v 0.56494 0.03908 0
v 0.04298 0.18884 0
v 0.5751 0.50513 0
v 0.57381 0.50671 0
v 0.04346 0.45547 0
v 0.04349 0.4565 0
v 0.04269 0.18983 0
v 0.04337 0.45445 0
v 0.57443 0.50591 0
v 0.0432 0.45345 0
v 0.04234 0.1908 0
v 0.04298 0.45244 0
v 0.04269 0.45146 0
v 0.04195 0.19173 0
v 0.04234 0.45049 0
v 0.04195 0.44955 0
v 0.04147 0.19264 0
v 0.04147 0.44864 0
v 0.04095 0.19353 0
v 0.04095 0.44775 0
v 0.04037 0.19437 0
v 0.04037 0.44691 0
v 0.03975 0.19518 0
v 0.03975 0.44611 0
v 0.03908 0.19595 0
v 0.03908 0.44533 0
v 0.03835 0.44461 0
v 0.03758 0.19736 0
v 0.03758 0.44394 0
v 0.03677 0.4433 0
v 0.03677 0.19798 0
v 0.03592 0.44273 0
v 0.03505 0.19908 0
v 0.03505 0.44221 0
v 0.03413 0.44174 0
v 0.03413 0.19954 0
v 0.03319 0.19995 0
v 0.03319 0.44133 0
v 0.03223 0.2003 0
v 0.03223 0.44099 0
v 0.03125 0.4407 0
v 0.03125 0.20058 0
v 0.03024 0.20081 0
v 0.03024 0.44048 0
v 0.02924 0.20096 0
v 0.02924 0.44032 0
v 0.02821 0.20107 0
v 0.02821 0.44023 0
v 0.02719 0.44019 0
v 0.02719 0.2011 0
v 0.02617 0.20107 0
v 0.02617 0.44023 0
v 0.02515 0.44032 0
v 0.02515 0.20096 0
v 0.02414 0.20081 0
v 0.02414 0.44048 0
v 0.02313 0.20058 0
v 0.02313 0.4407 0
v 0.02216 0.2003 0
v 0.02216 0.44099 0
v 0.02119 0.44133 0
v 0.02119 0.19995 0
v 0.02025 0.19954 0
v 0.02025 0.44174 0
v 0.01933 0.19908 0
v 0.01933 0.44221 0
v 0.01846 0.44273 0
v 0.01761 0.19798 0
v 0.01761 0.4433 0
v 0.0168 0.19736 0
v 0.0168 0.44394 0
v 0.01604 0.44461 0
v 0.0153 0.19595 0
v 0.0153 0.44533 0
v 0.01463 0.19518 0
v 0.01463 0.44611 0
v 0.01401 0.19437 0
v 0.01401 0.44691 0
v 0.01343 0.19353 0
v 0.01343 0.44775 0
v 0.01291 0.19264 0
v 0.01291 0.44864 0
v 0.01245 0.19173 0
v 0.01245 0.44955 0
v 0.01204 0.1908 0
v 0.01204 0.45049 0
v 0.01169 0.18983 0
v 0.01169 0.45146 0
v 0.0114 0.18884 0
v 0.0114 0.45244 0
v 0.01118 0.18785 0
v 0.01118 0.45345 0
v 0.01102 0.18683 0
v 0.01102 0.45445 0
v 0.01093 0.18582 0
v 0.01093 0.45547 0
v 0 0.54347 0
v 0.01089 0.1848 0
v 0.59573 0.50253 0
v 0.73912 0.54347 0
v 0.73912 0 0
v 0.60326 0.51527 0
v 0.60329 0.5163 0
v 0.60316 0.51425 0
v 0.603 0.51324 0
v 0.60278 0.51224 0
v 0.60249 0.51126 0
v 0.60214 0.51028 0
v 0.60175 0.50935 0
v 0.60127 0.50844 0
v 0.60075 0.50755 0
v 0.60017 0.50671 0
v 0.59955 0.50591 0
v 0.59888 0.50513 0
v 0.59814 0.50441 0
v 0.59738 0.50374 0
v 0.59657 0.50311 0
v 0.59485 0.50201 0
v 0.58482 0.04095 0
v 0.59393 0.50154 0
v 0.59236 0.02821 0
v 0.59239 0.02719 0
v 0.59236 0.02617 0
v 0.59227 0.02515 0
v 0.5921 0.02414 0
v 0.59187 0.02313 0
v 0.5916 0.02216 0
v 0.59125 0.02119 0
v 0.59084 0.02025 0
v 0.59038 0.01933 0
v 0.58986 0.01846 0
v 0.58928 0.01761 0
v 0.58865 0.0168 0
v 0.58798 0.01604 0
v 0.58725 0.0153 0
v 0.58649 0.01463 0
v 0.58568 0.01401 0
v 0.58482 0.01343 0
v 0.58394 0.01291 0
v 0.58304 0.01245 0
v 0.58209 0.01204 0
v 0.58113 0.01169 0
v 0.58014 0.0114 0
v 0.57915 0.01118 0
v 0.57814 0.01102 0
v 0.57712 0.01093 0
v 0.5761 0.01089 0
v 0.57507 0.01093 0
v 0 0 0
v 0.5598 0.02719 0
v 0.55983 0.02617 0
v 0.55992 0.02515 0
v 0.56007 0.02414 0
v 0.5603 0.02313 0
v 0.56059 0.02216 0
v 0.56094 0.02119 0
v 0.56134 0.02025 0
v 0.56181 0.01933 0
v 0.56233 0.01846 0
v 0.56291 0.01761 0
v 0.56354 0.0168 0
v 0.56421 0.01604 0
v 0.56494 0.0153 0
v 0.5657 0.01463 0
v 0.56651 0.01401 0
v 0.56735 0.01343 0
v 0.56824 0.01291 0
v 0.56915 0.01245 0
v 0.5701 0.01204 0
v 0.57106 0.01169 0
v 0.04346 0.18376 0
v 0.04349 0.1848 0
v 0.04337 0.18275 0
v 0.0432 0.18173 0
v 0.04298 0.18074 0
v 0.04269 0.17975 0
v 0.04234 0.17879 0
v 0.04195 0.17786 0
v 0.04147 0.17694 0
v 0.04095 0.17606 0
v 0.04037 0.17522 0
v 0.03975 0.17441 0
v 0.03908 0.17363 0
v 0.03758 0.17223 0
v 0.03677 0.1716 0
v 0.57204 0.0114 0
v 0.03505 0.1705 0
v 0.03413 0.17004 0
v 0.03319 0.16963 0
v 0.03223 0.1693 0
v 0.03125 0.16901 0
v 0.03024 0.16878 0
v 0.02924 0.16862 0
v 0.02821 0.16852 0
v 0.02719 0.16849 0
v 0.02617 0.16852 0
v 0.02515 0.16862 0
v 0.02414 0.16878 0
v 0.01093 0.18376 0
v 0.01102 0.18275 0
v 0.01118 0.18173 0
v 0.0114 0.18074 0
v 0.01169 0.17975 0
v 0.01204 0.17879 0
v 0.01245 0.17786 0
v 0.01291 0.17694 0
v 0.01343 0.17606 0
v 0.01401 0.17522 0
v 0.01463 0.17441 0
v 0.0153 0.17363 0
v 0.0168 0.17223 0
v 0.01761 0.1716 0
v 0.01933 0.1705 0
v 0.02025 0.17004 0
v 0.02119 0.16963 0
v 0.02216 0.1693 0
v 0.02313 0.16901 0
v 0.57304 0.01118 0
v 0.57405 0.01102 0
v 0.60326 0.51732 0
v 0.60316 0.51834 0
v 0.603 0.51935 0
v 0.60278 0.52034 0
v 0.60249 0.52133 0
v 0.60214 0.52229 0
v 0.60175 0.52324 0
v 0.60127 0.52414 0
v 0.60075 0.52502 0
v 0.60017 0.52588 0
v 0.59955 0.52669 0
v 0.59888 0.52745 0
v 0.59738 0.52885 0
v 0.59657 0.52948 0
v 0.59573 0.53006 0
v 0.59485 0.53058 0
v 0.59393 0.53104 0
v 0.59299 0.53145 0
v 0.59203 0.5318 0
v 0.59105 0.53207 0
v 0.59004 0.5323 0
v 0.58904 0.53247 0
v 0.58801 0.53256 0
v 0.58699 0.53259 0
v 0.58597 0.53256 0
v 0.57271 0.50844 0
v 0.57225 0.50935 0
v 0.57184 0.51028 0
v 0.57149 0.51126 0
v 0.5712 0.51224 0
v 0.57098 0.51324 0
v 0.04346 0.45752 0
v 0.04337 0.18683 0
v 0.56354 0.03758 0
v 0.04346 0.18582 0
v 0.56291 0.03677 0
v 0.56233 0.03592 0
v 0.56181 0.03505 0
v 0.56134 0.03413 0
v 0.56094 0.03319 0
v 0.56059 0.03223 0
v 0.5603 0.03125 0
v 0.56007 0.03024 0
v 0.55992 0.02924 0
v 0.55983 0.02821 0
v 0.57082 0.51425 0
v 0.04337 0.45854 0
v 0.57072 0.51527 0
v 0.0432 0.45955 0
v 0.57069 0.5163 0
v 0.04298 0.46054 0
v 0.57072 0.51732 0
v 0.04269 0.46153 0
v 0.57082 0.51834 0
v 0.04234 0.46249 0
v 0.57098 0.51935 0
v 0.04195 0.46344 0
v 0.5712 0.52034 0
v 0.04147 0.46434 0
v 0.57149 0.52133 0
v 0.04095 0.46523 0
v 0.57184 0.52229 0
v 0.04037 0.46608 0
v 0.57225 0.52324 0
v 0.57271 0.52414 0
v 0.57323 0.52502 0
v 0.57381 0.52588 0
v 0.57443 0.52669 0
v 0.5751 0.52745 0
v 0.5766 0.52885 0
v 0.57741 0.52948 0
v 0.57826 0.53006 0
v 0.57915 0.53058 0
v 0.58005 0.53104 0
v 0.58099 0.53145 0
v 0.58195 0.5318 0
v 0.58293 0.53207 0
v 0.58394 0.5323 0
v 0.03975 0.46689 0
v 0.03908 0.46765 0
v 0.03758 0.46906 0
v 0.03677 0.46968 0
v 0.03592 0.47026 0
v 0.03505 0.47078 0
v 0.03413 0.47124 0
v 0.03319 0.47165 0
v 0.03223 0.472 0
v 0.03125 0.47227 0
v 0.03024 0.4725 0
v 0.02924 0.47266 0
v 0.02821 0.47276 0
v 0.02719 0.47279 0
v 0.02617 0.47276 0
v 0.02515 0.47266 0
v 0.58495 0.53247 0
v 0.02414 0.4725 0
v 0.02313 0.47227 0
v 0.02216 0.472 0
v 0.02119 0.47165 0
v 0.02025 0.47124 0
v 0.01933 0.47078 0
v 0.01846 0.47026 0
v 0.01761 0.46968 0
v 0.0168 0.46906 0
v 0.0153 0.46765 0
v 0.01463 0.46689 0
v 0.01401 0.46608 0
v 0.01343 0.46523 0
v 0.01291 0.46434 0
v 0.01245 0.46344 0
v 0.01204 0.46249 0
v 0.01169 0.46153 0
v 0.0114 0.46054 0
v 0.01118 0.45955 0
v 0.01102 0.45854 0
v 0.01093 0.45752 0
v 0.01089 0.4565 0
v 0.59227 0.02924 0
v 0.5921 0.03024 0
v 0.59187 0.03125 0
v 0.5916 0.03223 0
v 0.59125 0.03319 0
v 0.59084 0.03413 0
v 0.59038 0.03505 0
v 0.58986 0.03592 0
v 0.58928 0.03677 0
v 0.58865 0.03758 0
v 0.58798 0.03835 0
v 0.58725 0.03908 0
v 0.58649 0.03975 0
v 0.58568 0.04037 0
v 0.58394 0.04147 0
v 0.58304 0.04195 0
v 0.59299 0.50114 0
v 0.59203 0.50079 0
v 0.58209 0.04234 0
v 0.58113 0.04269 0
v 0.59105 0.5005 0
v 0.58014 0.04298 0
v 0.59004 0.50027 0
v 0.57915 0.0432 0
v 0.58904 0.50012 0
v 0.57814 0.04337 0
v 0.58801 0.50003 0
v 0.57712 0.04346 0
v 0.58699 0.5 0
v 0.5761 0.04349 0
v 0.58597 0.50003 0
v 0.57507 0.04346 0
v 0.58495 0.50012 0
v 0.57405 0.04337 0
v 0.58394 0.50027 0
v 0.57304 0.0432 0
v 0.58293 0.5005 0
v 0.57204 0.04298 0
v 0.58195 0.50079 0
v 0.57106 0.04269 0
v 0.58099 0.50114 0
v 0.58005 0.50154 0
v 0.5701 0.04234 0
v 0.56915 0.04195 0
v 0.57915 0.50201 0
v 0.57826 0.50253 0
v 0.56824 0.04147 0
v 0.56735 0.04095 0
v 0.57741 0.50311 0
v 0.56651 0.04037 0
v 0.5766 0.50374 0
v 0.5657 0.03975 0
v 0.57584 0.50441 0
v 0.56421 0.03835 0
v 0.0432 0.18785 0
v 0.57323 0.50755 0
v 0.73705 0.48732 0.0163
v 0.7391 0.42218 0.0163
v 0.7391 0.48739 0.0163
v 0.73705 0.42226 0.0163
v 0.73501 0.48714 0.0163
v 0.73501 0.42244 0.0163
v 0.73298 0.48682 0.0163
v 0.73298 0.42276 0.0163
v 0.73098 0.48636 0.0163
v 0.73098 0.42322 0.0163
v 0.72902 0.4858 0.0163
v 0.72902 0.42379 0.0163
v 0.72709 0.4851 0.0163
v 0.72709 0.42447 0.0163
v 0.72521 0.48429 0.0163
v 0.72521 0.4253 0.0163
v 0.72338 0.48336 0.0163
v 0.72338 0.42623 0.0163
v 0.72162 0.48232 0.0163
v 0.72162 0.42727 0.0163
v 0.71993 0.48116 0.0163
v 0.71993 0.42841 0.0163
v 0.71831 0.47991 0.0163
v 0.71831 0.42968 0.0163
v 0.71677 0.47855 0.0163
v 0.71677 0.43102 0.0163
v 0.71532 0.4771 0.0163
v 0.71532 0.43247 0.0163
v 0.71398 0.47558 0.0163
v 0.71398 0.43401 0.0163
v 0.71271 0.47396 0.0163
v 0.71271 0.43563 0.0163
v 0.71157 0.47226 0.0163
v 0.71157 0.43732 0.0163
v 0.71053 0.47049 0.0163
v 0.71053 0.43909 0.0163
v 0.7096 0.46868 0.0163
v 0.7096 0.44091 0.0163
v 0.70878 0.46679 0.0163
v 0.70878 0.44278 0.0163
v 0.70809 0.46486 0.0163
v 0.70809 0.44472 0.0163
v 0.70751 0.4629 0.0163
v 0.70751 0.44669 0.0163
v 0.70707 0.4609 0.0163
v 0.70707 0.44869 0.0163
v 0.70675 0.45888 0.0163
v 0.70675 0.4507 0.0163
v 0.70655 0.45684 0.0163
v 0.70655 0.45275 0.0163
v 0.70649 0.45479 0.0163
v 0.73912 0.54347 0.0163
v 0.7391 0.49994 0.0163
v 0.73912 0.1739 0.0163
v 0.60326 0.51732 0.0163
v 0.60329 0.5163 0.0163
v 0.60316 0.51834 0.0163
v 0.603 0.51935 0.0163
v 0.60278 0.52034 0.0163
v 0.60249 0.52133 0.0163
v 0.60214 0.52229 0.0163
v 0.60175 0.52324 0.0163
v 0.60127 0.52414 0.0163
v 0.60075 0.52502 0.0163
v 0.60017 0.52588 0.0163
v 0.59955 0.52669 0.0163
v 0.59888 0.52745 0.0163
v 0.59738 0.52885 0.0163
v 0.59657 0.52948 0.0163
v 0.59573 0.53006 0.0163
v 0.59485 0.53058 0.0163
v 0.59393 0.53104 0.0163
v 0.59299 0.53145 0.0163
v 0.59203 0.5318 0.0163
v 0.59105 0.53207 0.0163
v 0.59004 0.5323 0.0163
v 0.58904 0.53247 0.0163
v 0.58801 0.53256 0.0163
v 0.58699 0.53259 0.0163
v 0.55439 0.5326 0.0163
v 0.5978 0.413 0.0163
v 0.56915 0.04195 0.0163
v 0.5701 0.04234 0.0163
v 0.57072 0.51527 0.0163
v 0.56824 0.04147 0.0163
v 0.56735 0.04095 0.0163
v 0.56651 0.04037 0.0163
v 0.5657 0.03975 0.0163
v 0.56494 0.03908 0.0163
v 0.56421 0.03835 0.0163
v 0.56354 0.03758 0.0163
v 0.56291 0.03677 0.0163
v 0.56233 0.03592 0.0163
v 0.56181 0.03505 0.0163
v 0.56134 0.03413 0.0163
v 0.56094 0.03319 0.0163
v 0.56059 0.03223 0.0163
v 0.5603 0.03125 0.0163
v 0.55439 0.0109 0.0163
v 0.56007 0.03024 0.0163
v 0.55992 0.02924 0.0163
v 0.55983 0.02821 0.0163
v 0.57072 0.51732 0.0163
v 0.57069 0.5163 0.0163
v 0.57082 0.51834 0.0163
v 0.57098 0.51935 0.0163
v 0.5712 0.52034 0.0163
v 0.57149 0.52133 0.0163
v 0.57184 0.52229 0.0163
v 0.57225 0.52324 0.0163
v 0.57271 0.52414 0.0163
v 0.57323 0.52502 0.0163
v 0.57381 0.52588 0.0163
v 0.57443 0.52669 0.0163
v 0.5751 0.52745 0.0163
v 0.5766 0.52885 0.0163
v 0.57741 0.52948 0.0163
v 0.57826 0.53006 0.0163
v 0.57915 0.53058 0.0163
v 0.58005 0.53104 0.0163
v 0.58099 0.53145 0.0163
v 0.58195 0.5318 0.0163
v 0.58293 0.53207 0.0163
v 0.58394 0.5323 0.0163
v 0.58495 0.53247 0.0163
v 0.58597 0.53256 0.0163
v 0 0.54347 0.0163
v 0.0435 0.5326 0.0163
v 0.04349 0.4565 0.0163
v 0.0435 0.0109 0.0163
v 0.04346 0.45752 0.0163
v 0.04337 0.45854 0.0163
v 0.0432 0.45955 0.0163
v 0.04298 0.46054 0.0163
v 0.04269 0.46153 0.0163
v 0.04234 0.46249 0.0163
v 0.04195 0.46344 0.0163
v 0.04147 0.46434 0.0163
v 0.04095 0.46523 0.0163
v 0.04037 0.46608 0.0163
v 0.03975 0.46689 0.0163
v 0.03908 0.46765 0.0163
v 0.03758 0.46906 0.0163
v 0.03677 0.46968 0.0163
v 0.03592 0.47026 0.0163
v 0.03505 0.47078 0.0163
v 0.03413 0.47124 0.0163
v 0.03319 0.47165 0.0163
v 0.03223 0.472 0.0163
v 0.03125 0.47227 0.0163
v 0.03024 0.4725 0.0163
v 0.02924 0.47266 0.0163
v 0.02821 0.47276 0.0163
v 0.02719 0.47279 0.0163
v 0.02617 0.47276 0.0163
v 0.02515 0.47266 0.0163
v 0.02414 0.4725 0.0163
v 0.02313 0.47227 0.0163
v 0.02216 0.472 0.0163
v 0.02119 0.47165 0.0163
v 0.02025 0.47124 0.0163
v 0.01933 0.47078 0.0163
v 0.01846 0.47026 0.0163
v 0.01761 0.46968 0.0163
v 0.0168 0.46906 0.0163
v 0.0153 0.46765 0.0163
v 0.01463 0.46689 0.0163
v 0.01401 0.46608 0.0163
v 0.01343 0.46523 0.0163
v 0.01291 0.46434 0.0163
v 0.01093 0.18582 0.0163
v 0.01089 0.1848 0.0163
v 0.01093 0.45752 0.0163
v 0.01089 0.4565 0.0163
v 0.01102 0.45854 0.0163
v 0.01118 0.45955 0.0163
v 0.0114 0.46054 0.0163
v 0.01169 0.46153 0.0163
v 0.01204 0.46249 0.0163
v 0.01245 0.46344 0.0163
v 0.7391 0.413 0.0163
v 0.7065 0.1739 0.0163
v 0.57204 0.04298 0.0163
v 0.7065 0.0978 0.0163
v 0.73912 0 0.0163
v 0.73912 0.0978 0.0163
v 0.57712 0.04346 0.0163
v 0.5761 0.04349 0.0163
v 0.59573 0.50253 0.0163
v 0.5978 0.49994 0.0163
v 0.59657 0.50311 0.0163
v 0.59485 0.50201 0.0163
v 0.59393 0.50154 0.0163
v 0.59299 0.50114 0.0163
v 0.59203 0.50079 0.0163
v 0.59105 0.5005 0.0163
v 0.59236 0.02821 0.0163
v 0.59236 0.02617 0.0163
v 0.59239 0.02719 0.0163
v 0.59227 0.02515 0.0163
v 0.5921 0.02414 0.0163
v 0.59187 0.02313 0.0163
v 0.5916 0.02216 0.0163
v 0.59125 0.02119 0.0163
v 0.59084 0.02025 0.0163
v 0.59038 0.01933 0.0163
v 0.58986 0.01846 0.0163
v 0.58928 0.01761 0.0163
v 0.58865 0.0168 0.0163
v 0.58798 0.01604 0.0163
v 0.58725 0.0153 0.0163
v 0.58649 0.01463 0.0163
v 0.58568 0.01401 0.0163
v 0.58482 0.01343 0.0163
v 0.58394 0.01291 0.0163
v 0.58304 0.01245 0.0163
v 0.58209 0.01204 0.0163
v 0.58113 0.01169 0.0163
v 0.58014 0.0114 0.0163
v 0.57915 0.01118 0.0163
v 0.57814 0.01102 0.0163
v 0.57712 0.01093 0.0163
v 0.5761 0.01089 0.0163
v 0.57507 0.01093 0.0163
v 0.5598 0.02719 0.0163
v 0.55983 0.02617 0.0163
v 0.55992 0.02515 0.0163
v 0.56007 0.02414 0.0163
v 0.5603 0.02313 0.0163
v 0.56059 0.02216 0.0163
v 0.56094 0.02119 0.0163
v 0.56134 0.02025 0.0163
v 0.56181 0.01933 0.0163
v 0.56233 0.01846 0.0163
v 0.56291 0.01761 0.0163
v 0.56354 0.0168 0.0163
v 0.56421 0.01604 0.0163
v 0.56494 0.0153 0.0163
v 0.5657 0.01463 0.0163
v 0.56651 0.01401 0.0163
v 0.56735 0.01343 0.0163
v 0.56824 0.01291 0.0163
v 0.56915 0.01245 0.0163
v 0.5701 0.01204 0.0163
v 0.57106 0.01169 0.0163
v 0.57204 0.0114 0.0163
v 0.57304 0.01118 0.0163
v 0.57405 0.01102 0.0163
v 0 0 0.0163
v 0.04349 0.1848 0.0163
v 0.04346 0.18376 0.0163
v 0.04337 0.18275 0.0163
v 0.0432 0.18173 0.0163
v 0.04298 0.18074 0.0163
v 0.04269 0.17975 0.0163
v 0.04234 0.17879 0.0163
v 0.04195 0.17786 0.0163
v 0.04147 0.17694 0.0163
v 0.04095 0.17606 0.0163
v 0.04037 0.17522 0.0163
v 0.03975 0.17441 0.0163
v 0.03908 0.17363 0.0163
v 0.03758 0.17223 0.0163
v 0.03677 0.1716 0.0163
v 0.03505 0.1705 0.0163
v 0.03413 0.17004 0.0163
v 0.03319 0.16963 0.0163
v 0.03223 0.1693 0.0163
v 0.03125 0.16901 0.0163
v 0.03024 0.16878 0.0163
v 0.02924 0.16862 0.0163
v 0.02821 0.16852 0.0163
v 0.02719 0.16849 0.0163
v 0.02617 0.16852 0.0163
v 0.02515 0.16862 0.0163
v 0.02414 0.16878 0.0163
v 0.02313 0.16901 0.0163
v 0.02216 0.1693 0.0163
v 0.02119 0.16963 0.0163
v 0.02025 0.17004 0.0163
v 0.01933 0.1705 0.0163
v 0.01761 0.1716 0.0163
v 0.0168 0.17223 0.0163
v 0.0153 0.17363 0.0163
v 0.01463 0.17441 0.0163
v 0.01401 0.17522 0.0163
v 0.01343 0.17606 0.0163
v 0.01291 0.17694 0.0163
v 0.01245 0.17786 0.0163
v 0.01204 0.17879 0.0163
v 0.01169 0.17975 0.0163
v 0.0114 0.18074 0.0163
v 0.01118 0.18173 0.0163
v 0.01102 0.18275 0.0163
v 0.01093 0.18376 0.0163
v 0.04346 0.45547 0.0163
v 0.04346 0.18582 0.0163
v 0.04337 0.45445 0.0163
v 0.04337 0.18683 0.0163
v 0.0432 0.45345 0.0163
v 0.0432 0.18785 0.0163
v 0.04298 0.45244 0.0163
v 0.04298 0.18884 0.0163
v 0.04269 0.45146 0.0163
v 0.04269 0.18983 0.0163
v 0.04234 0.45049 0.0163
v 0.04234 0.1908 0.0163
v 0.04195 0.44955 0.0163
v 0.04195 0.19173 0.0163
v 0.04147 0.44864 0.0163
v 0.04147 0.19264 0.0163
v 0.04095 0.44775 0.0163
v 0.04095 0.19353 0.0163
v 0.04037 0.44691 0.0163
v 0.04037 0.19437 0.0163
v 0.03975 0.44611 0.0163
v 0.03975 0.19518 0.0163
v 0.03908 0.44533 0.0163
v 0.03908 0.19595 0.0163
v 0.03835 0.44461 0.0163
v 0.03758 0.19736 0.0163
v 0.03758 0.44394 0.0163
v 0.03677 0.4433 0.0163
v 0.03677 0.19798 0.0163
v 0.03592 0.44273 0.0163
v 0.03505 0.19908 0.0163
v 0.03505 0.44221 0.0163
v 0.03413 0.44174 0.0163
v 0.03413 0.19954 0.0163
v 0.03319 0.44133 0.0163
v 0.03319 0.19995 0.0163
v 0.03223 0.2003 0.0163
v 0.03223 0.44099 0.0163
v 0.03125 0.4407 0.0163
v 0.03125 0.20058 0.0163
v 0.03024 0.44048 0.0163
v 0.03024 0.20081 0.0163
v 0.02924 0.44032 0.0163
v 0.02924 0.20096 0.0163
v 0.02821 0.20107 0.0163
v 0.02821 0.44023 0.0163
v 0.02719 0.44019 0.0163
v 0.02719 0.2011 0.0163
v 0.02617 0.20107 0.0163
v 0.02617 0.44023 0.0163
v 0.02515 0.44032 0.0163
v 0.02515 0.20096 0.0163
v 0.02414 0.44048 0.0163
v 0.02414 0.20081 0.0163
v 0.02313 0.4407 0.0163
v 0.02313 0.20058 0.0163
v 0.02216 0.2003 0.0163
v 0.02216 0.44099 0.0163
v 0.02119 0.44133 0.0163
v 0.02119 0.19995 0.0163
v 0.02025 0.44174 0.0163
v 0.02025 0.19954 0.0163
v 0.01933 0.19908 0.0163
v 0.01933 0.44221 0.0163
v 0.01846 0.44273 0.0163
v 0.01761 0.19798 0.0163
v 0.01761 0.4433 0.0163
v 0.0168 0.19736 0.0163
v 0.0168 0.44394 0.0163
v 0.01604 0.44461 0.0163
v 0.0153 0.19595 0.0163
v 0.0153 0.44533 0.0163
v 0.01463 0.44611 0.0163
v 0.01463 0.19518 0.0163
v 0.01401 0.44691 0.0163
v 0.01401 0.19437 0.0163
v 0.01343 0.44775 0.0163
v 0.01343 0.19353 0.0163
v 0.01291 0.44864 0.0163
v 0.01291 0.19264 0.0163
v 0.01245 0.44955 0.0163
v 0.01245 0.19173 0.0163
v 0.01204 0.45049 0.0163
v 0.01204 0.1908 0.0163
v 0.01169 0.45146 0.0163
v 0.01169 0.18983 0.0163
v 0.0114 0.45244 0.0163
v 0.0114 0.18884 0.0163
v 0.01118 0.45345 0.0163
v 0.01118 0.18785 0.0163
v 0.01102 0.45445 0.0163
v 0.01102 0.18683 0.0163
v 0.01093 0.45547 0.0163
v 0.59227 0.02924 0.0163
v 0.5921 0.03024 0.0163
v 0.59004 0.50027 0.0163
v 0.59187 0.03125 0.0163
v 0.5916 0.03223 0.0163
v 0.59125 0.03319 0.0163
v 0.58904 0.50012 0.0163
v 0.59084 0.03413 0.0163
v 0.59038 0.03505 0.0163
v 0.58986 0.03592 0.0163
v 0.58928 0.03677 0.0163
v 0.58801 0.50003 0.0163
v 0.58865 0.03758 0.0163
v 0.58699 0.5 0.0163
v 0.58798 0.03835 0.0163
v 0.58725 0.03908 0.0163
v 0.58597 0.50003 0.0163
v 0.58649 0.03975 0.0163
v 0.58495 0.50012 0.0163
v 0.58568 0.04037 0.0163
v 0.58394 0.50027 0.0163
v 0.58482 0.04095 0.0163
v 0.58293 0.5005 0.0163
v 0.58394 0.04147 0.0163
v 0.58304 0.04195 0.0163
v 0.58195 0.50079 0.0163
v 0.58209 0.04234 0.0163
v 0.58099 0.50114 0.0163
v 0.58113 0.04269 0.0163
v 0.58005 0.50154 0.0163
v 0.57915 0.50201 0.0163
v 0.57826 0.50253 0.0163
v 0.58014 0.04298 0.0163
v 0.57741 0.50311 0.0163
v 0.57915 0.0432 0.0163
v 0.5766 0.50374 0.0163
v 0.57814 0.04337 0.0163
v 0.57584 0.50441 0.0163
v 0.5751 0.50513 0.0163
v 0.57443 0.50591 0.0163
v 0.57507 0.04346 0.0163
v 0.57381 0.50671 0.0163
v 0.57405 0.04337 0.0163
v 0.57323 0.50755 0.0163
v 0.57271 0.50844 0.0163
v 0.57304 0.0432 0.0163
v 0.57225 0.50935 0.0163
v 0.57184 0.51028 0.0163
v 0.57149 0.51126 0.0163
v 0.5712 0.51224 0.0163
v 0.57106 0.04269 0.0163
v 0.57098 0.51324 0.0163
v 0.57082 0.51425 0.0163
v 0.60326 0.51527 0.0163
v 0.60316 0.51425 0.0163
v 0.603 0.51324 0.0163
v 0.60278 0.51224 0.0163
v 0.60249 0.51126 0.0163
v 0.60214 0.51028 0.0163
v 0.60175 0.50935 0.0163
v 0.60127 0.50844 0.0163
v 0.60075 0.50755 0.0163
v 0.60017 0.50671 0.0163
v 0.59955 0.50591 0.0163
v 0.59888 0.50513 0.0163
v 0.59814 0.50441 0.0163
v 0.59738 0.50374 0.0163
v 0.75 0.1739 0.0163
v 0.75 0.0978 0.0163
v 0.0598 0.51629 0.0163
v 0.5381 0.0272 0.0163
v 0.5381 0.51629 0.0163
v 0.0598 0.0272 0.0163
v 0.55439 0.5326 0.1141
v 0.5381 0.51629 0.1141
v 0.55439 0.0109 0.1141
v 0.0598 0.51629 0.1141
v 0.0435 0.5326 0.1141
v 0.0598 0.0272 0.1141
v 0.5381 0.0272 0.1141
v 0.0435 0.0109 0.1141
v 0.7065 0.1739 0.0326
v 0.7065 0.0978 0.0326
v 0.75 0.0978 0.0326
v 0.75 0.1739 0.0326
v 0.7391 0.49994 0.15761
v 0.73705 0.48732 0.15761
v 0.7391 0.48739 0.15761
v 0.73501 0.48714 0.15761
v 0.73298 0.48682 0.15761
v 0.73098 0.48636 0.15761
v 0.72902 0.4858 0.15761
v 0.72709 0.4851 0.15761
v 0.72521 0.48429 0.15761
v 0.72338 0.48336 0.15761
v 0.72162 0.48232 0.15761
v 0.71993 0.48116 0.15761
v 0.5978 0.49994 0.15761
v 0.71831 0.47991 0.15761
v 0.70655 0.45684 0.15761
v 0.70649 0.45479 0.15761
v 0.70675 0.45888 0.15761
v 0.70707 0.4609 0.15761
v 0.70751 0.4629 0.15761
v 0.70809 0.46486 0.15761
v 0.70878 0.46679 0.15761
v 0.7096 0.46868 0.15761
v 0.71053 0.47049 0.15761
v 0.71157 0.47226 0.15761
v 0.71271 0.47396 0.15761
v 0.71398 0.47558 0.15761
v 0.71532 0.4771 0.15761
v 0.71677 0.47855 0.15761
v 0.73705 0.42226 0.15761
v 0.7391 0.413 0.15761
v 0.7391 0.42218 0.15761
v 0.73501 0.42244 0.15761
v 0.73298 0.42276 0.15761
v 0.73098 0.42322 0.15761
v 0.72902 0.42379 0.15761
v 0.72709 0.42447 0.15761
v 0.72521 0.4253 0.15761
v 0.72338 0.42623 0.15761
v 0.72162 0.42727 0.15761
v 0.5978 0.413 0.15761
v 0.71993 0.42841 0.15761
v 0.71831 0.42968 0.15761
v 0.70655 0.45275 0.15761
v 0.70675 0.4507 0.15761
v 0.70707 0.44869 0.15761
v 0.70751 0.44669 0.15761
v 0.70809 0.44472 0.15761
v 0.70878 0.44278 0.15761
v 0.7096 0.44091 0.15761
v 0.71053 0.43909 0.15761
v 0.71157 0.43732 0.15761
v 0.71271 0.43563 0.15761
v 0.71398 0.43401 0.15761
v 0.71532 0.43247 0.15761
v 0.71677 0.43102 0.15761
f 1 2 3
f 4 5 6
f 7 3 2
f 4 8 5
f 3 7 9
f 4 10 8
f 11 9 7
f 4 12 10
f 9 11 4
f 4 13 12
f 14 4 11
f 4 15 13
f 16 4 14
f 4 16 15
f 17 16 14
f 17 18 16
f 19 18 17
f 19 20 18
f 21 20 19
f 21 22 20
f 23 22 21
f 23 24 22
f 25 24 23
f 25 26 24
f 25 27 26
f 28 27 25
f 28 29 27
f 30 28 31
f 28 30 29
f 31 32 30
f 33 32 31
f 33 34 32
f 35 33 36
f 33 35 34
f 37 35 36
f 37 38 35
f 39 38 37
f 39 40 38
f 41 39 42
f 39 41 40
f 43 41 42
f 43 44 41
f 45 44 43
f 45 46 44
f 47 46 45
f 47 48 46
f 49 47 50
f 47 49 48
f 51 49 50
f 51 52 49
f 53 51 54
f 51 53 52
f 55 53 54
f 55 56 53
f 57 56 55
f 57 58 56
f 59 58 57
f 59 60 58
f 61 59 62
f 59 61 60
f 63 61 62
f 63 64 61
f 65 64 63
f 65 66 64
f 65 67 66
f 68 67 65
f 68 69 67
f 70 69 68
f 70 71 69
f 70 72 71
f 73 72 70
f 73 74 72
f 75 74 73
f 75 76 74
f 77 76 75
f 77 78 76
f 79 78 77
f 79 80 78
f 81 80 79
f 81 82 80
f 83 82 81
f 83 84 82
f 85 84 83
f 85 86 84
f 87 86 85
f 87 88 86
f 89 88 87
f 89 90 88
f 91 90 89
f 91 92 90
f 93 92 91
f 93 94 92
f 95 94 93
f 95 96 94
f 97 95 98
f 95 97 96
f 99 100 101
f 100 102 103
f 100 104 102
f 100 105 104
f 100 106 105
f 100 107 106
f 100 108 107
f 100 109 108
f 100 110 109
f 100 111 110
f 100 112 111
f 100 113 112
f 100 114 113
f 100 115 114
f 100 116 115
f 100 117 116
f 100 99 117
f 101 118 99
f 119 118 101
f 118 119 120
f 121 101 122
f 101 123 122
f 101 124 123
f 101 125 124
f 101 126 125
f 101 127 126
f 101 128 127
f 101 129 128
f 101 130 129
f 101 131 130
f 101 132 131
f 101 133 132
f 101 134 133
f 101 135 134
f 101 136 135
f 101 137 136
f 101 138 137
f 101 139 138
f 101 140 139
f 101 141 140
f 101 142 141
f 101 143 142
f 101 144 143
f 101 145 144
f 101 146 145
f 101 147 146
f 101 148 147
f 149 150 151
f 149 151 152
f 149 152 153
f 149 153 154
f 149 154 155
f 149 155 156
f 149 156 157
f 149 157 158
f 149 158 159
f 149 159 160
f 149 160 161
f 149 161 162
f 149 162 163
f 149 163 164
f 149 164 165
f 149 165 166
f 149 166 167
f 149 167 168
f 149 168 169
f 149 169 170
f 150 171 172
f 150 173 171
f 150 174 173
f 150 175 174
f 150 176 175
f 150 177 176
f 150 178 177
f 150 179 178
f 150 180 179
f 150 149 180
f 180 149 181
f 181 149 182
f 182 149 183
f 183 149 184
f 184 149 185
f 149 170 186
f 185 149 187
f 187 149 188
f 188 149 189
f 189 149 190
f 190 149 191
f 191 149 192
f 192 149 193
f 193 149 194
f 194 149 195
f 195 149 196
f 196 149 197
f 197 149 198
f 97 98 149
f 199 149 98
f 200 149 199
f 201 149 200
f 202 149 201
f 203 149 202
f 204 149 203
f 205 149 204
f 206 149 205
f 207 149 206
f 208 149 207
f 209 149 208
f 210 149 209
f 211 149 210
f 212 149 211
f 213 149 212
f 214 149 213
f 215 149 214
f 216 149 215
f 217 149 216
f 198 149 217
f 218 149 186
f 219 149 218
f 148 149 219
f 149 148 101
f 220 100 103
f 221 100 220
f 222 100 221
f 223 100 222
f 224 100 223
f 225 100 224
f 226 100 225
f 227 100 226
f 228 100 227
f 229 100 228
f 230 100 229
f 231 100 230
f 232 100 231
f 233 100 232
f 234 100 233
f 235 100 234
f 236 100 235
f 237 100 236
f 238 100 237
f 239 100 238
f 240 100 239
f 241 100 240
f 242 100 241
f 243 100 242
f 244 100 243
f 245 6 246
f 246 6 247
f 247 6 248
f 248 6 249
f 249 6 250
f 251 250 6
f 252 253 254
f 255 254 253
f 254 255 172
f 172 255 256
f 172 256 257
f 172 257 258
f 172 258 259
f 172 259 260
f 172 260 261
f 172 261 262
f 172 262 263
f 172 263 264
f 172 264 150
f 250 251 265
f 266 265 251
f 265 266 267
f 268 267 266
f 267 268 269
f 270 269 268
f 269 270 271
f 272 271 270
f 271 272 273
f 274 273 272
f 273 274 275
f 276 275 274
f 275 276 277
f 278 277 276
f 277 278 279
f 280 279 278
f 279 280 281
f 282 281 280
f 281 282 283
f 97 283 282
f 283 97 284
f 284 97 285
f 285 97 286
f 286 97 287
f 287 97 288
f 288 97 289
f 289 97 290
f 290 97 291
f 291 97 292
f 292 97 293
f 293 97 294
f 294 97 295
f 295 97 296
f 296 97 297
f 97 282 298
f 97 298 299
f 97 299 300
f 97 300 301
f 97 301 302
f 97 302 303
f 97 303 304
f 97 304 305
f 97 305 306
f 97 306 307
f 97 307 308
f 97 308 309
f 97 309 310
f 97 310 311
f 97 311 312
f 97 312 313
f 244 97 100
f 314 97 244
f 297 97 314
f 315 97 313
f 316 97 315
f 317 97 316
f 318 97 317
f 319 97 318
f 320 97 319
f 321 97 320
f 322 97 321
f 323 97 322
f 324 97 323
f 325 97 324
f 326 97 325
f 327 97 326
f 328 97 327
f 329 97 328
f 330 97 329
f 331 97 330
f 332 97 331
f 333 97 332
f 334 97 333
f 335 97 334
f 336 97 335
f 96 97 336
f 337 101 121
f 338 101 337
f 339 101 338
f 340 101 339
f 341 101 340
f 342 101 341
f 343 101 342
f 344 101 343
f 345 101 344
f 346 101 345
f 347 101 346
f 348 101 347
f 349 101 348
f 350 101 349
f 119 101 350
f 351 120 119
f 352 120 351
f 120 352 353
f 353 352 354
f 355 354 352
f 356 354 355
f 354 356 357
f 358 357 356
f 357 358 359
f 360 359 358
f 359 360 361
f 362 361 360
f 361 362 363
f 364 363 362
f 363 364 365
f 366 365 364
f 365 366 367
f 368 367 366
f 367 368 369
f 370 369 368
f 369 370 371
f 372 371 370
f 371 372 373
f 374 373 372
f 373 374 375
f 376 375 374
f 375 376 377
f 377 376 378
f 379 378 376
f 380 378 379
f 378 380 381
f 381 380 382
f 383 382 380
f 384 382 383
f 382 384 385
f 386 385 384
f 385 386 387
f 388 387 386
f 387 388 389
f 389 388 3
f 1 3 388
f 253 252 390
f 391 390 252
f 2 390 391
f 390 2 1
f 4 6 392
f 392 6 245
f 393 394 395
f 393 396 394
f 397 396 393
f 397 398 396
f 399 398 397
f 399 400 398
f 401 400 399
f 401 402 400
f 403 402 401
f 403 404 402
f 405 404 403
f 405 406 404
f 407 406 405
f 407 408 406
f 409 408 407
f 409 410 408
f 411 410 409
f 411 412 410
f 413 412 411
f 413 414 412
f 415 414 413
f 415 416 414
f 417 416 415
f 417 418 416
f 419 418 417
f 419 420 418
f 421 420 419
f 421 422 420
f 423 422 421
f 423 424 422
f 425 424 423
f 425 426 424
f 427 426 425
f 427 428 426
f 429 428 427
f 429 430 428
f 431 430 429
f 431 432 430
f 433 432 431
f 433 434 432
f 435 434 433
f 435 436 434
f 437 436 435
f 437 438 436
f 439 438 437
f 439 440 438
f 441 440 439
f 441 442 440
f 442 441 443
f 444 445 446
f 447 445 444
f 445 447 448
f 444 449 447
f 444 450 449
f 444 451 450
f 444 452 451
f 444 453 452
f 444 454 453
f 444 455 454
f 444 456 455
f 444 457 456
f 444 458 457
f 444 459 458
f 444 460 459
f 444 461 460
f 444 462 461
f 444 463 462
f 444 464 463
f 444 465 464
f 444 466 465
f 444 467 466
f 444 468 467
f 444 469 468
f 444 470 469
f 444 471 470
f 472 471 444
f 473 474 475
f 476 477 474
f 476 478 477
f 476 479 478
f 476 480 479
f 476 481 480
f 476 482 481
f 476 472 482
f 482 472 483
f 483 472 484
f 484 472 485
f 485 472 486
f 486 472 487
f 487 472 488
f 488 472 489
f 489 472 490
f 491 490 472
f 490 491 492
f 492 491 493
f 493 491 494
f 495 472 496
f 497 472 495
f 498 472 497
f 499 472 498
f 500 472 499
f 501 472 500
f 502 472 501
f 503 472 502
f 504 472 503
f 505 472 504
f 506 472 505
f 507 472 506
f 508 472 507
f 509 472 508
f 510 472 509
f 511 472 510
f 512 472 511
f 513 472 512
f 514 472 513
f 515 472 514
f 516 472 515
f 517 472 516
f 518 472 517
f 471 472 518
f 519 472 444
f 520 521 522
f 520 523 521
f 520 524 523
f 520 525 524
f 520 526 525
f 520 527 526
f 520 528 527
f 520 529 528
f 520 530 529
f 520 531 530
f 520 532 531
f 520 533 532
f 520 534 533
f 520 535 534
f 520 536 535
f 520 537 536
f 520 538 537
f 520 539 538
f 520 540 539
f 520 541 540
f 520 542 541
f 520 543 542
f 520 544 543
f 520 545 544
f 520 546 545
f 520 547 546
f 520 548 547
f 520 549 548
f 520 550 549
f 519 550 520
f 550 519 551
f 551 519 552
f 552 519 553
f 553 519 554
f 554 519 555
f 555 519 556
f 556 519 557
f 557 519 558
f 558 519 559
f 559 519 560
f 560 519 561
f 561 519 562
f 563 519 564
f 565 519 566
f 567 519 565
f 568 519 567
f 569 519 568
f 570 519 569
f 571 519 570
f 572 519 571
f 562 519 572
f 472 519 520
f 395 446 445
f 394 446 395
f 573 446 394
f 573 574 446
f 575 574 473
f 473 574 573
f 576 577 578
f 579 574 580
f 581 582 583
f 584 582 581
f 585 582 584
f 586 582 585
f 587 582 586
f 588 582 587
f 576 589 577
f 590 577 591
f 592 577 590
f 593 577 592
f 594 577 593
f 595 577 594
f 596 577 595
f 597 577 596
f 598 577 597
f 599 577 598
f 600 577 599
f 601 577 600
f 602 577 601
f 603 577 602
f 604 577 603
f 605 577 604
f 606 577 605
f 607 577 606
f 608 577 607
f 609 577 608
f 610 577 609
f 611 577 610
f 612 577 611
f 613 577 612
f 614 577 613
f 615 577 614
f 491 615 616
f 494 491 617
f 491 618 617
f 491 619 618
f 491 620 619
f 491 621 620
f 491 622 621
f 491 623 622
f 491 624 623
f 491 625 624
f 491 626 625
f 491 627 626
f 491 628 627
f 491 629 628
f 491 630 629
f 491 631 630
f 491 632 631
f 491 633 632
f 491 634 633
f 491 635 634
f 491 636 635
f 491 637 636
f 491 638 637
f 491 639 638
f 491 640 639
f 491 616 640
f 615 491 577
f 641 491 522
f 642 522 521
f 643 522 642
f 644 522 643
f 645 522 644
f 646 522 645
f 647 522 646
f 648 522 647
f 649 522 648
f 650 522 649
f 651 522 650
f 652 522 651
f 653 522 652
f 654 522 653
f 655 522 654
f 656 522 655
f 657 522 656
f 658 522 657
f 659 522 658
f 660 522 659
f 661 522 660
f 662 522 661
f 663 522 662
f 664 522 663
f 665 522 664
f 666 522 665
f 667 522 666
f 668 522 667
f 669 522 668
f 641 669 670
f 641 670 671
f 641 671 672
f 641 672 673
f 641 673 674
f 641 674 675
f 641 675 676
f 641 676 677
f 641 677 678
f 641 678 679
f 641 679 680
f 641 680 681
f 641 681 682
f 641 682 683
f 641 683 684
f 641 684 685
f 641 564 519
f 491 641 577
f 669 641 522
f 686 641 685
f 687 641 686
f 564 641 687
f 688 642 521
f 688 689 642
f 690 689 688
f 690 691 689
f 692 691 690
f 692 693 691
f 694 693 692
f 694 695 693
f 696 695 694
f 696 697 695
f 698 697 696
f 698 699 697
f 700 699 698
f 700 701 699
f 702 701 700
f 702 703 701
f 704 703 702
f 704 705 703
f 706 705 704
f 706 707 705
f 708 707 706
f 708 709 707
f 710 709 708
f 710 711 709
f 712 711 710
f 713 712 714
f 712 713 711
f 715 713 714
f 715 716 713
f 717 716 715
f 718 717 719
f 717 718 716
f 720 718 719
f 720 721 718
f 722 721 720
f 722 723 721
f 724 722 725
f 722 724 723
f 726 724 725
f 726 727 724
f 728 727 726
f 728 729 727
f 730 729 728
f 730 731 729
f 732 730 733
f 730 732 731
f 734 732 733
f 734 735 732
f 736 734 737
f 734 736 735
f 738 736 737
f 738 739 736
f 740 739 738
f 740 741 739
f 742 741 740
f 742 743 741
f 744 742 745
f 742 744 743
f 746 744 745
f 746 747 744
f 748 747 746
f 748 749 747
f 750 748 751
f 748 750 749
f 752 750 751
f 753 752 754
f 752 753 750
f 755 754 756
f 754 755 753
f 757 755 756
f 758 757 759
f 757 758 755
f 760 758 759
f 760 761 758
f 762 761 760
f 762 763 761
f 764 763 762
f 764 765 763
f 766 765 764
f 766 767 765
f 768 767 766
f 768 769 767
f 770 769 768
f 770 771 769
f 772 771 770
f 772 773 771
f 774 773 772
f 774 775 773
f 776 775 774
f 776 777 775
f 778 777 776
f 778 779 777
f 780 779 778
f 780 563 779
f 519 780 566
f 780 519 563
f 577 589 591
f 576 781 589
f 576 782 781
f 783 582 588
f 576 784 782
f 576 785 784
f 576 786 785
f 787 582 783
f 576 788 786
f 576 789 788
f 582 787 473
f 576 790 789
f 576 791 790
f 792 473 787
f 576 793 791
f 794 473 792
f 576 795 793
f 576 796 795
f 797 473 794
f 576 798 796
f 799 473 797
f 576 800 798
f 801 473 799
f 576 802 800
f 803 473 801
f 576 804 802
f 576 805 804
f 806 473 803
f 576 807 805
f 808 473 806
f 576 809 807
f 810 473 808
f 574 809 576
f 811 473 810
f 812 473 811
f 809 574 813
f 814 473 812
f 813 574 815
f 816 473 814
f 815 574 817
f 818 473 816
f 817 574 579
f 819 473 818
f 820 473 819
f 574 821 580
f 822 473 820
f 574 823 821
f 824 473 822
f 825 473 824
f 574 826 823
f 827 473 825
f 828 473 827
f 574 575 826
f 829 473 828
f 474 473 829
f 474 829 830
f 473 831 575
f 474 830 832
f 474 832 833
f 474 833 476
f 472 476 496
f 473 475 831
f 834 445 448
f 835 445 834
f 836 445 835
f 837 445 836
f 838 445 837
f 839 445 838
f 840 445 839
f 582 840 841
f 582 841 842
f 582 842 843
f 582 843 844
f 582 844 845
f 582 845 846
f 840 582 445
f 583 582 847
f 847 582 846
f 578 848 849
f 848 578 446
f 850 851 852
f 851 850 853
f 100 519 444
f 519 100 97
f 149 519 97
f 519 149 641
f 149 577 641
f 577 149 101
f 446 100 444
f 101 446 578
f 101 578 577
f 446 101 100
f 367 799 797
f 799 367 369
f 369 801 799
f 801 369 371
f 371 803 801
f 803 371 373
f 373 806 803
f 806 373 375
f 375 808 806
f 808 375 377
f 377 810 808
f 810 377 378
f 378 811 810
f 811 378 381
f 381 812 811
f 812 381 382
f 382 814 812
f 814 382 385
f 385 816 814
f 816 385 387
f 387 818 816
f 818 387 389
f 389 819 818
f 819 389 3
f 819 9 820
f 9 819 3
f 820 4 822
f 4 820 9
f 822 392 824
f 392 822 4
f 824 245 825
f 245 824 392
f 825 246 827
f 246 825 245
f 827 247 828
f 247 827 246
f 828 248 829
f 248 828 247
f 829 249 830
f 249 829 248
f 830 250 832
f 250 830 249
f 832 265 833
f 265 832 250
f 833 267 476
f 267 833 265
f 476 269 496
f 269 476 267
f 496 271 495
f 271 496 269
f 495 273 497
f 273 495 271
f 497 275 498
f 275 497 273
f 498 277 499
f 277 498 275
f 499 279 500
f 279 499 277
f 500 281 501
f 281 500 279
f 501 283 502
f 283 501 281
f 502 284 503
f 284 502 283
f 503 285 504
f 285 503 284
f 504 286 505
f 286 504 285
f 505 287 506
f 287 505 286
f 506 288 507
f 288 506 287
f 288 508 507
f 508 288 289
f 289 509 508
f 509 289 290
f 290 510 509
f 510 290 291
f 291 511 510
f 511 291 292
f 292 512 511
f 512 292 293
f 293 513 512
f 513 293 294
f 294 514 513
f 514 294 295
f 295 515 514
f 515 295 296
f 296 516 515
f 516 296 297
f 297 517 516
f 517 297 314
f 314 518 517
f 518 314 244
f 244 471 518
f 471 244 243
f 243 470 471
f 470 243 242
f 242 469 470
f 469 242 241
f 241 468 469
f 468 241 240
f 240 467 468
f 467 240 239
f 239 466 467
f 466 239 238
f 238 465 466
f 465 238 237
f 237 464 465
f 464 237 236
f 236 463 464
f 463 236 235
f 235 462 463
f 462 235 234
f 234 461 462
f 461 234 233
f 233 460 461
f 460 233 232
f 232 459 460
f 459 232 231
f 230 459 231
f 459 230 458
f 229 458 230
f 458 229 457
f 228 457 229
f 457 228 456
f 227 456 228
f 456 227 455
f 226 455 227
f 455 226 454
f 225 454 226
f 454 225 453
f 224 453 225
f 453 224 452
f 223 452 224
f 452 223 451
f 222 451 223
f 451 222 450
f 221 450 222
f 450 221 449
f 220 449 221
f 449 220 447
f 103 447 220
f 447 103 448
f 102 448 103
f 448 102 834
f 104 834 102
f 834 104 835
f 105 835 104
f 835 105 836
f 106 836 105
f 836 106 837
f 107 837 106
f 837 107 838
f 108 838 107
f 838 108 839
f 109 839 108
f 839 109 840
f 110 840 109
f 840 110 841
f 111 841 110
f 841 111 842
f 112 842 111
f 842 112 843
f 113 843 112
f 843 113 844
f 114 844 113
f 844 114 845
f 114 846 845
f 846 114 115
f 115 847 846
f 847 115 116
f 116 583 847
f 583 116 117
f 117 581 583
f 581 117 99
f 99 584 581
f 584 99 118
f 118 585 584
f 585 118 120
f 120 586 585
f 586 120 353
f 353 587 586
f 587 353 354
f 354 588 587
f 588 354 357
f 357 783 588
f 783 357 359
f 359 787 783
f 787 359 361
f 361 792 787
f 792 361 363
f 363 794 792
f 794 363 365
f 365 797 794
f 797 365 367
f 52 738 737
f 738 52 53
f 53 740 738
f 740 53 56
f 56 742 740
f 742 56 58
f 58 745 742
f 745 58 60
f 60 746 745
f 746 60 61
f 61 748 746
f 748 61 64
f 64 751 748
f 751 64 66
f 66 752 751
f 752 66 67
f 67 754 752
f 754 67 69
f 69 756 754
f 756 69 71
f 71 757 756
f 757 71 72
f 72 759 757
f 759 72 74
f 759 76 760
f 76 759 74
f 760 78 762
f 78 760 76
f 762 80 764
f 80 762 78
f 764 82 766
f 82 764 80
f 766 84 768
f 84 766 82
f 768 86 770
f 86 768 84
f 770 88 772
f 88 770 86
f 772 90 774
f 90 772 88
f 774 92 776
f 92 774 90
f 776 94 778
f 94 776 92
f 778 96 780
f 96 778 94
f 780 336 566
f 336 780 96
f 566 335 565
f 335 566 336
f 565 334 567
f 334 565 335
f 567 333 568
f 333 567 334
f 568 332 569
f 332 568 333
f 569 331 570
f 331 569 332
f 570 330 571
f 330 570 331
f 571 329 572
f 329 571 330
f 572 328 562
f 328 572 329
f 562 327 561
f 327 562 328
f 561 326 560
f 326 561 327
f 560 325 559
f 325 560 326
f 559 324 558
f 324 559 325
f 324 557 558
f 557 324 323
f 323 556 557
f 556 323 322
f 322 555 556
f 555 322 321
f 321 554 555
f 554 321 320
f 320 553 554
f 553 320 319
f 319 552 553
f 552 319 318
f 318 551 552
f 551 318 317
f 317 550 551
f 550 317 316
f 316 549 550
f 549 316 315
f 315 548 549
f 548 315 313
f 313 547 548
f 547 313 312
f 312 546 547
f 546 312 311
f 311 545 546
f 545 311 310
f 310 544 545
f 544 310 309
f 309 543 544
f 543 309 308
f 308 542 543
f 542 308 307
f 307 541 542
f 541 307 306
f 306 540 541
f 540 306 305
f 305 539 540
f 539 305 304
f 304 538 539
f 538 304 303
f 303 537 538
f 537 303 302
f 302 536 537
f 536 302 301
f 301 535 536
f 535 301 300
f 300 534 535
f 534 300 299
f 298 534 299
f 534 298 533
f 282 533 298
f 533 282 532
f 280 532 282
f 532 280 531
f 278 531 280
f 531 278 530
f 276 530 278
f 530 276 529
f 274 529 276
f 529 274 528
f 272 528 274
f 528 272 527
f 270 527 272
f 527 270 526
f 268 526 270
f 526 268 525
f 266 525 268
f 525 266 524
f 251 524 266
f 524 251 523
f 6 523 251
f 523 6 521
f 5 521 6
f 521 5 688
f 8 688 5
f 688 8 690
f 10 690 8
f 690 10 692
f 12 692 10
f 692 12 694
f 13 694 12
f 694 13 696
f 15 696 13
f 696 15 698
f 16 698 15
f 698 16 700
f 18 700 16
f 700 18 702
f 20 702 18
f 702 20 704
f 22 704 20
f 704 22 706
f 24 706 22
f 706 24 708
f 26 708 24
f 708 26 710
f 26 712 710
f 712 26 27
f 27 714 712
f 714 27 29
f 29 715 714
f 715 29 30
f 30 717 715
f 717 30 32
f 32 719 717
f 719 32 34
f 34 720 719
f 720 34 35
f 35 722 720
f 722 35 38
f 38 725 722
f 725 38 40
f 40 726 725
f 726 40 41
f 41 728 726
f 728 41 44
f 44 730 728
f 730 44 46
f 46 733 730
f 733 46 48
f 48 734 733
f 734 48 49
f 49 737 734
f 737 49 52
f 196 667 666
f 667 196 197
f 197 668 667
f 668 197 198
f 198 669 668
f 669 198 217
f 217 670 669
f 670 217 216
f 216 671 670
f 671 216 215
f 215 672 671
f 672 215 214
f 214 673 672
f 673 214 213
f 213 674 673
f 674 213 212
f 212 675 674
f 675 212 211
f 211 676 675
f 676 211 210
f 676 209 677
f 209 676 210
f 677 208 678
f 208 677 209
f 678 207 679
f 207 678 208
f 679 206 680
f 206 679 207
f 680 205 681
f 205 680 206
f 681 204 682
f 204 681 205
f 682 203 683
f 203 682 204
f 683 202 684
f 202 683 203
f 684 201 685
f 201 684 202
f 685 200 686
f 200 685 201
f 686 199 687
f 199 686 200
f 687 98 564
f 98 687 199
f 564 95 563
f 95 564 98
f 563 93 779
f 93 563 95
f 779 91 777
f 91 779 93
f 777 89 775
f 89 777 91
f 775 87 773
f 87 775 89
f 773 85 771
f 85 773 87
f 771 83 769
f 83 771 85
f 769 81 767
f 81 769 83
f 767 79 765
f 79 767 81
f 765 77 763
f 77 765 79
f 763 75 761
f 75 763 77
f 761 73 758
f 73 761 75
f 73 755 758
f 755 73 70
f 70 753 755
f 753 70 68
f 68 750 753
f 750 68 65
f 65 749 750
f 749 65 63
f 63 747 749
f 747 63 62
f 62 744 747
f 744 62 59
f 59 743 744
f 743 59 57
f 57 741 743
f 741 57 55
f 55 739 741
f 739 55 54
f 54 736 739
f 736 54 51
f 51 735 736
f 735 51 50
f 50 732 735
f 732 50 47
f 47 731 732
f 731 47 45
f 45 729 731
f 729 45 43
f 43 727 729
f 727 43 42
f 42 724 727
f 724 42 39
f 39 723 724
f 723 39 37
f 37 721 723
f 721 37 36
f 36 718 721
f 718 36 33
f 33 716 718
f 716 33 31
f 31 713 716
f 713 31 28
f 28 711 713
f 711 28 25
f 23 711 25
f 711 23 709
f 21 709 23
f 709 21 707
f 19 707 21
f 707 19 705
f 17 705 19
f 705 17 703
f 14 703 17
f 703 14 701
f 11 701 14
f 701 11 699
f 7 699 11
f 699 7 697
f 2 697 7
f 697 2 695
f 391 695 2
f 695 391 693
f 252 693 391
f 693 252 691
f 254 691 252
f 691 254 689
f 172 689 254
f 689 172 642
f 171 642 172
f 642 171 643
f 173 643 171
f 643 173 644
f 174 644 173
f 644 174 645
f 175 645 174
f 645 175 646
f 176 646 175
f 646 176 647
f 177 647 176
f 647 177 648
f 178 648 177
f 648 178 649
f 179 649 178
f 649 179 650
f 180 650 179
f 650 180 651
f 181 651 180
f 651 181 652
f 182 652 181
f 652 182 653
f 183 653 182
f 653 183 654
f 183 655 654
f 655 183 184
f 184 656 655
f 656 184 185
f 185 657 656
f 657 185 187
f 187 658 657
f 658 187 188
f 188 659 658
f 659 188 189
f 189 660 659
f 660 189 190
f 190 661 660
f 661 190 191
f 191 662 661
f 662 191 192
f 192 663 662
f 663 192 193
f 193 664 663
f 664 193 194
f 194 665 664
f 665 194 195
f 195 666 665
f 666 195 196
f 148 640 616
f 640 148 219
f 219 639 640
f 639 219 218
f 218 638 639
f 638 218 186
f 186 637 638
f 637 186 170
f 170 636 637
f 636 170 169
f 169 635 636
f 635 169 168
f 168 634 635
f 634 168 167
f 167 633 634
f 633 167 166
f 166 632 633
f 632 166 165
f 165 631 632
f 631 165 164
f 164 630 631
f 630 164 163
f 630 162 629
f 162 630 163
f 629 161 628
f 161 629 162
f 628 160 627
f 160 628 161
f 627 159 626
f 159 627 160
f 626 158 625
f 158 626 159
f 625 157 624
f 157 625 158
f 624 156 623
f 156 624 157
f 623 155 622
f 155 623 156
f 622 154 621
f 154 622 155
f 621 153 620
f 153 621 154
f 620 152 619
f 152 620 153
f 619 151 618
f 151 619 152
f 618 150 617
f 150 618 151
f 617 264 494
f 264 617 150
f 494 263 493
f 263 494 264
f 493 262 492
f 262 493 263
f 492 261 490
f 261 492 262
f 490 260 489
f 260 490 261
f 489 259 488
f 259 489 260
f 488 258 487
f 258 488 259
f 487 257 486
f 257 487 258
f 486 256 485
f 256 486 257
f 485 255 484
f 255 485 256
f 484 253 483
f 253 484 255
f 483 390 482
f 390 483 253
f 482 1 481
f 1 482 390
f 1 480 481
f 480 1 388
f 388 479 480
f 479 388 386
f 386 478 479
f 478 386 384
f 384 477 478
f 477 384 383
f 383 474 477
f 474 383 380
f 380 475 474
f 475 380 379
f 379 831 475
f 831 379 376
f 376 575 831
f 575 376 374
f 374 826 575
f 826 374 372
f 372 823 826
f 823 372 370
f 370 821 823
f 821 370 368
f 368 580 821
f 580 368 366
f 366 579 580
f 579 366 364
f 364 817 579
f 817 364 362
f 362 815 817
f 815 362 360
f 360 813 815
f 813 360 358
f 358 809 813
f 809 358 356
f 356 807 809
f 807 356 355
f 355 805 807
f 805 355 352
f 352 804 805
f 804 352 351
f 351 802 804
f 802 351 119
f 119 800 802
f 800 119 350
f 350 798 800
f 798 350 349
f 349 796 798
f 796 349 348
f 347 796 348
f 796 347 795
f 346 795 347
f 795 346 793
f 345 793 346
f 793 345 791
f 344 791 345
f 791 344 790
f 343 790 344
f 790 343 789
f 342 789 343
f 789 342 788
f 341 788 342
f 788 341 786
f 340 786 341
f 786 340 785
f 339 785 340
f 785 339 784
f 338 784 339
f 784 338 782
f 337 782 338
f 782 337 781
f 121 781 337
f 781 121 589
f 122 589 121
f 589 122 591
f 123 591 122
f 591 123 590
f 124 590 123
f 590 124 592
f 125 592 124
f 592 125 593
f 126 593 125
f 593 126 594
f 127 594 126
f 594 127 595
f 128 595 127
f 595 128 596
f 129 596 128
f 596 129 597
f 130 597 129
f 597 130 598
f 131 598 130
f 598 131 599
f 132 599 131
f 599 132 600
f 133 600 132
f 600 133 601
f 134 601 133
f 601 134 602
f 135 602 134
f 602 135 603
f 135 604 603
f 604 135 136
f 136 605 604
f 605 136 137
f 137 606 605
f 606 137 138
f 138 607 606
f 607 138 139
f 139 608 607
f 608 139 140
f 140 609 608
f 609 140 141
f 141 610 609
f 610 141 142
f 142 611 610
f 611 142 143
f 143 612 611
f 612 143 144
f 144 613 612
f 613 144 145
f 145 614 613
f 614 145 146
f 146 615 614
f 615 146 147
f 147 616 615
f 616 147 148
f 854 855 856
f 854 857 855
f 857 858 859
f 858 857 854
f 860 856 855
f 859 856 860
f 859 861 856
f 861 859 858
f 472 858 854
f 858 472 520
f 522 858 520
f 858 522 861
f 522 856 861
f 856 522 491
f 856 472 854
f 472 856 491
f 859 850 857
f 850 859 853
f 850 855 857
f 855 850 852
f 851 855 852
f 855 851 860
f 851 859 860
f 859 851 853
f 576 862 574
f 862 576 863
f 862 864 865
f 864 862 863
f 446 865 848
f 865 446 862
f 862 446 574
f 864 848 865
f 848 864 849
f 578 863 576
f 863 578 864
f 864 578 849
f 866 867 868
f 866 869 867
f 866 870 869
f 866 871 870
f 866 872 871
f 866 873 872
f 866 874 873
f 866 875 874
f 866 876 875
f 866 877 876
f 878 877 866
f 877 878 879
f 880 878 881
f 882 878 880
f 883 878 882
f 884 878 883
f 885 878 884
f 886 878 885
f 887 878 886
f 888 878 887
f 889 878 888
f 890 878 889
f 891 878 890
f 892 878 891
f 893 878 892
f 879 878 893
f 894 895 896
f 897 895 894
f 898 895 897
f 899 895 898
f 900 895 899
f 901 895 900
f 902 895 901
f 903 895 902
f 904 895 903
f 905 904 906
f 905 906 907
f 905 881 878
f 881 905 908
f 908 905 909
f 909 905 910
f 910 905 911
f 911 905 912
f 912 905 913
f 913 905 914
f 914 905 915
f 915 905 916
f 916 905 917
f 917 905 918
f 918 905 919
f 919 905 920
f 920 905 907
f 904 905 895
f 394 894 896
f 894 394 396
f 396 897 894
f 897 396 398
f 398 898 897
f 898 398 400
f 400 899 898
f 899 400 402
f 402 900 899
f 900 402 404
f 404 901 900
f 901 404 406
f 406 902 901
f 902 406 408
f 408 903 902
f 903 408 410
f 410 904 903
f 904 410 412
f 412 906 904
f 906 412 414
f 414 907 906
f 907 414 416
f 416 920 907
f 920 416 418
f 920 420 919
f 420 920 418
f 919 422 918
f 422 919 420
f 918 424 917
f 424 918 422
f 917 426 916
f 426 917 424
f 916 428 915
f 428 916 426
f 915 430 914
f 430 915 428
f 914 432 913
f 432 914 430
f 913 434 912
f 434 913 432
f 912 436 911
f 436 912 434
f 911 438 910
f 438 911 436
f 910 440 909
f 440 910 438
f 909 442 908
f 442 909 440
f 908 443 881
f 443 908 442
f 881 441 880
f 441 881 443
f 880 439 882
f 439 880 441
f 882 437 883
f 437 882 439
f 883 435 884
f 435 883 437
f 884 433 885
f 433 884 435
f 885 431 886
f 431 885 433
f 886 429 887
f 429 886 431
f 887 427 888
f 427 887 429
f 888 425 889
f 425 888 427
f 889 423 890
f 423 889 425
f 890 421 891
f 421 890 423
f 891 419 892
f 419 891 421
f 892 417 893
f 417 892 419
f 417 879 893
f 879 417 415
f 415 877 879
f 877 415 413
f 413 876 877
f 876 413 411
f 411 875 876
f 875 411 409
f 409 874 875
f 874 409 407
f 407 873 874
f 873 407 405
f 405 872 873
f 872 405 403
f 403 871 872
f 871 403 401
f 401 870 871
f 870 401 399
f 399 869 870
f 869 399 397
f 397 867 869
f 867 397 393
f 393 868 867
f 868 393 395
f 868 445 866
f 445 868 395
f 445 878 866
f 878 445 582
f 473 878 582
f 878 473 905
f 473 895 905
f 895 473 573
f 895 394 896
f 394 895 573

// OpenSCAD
$fn = 100;

// Parameters
base_length = 0.73913;
base_width = 0.543478;
base_height = 0.016304;

base_hole_radius = 0.0163;
base_hole_centers = [
    [0.0272, 0.1848],
    [0.0272, 0.4565],
    [0.5761, 0.0272],
    [0.5870, 0.5163]
];

// Rail outline
rail_outer_length = 0.5109;
rail_outer_width = 0.5217;
rail_offset_left = 0.0435;
rail_offset_front = 0.0109;
rail_offset_right_ref = 0.1847;
rail_offset_back_ref = 0.0109;
rail_height = 0.0978;
rail_rib_thickness = 0.0163;

// Shallow tab
tab_length = 0.0435;
tab_width = 0.0761;
tab_offset_left = 0.7065;
tab_offset_front = 0.0978;
tab_offset_right_ref = -0.0109;
tab_offset_back_ref = 0.3696;
tab_height = 0.0163;

// Deeper side block
side_block_length = 0.1413;
side_block_width = 0.086957;
side_block_offset_left = 0.5978;
side_block_offset_front = 0.4130;
side_block_offset_right_ref = 0;
side_block_offset_back_ref = 0.0435;
side_block_source_width_ref = 0.125;
side_block_height = 0.141304;

side_block_hole_radius = 0.0326;
side_block_hole_center = [0.7391, 0.4548];

// Helper extrusion
module extrude_profile_at(x, y, z, h, conv=10) {
    translate([x, y, z])
        linear_extrude(height=h, convexity=conv)
            children();
}

// 2D rectangular rib outline
module rectangular_rib_outline_2d(outer_l, outer_w, rib_t) {
    difference() {
        square([outer_l, outer_w]);
        translate([rib_t, rib_t])
            square([outer_l - 2*rib_t, outer_w - 2*rib_t]);
    }
}

// Base plate with four through holes
module base_plate() {
    extrude_profile_at(0, 0, 0, base_height) {
        difference() {
            square([base_length, base_width]);
            for (c = base_hole_centers)
                translate([c[0], c[1]])
                    circle(r=base_hole_radius);
        }
    }
}

// Raised rail group as an outline, not a filled pad
module raised_rail_group() {
    extrude_profile_at(rail_offset_left, rail_offset_front, base_height, rail_height) {
        rectangular_rib_outline_2d(
            rail_outer_length,
            rail_outer_width,
            rail_rib_thickness
        );
    }
}

// Shallow upper tab
module shallow_tab() {
    extrude_profile_at(tab_offset_left, tab_offset_front, base_height, tab_height) {
        square([tab_length, tab_width]);
    }
}

// Deeper side block with through opening
module side_block() {
    extrude_profile_at(side_block_offset_left, side_block_offset_front, base_height, side_block_height) {
        difference() {
            square([side_block_length, side_block_width]);
            translate([
                side_block_hole_center[0] - side_block_offset_left,
                side_block_hole_center[1] - side_block_offset_front
            ])
                circle(r=side_block_hole_radius);
        }
    }
}

// Main model
union() {
    base_plate();
    raised_rail_group();
    shallow_tab();
    side_block();
}
